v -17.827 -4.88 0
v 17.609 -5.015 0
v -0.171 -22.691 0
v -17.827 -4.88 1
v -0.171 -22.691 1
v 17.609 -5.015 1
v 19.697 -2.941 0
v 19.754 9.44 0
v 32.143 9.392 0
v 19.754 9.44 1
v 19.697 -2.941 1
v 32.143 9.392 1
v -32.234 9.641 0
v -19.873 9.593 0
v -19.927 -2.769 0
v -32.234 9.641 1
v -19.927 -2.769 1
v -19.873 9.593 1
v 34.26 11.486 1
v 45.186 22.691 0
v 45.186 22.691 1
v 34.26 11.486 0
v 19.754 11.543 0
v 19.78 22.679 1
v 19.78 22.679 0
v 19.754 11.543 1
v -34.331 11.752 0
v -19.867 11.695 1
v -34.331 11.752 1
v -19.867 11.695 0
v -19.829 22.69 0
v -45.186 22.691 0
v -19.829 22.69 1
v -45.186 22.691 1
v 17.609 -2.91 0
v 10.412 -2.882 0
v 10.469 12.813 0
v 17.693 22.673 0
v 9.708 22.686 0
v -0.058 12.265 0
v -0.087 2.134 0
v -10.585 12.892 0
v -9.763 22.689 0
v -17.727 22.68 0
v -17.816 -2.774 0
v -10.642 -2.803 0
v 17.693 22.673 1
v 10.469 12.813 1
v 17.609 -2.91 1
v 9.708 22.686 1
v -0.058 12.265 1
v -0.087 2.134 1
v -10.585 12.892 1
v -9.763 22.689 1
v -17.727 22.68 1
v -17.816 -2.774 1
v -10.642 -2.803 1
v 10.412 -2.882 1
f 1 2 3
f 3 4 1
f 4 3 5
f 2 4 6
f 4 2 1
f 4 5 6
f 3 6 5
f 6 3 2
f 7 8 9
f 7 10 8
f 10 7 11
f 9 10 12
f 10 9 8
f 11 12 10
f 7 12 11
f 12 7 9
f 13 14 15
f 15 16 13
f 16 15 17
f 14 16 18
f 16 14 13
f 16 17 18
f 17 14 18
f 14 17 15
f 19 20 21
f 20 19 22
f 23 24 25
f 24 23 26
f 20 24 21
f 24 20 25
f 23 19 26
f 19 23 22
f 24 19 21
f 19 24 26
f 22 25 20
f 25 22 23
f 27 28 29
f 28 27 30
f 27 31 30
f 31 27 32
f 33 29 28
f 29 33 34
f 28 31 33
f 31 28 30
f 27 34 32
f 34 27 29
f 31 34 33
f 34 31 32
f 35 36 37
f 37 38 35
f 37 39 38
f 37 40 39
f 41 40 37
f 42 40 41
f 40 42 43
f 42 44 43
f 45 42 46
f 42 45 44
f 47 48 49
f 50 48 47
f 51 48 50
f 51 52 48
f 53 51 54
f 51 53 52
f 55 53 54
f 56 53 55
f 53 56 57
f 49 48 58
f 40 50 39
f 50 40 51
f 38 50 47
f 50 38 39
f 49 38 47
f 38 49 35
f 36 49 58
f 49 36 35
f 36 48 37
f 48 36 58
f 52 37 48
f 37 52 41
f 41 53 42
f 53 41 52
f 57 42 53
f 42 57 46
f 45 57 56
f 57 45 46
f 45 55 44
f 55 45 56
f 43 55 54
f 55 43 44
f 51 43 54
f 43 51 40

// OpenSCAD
// Module names are of the form poly_<inkscape-path-id>().
// As a result you can associate a polygon in this OpenSCAD program with the
//  corresponding SVG element in the Inkscape document by looking for 
//  the XML element with the attribute id="inkscape-path-id".

// Paths have their own variables so they can be imported and used 
//  in polygon(points) structures in other programs.
// The NN_points is the list of all polygon XY vertices. 
// There may be an NN_paths variable as well. If it exists then it 
//  defines the nested paths. Both must be used in the 
//  polygon(points, paths) variant of the command.

profile_scale = 25.4/90; //made in inkscape in mm

// helper functions to determine the X,Y dimensions of the profiles
function min_x(shape_points) = min([ for (x = shape_points) min(x[0])]);
function max_x(shape_points) = max([ for (x = shape_points) max(x[0])]);
function min_y(shape_points) = min([ for (x = shape_points) min(x[1])]);
function max_y(shape_points) = max([ for (x = shape_points) max(x[1])]);

height = 1;
width = 1.0;


path2_0_points = [[-63.166600,17.290140],[62.393400,17.770140],[-0.606600,80.400140],[-63.166600,17.290140]];
path2_1_points = [[113.893400,-33.279860],[69.993400,-33.449860],[69.793400,10.420140],[113.893400,-33.279860]];
path2_2_points = [[-114.216600,-34.159860],[-70.416600,-33.989860],[-70.606600,9.810140],[-114.216600,-34.159860]];
path2_3_points = [[160.106600,-80.400140],[70.087790,-80.356915],[69.993400,-40.899860],[121.393400,-40.699860],[160.106600,-80.400140]];
path2_4_points = [[-160.106600,-80.399860],[-70.259801,-80.397182],[-70.396600,-41.439860],[-121.646600,-41.639860],[-160.106600,-80.399860]];
path2_5_points = [[-0.206600,-43.459860],[34.399010,-80.384908],[62.693400,-80.338911],[62.393400,10.310140],[36.893400,10.210140],[37.093400,-45.399860],[-0.306600,-7.559860],[-37.506600,-45.679860],[-37.706600,9.930140],[-63.126600,9.830140],[-62.813938,-80.360599],[-34.593290,-80.394650],[-0.206600,-43.459860]];

module poly_path2(h, w, res=4)  {
  scale([profile_scale, -profile_scale, 1])
  union()  {
    linear_extrude(height=h)
      polygon(path2_0_points);
    linear_extrude(height=h)
      polygon(path2_1_points);
    linear_extrude(height=h)
      polygon(path2_2_points);
    linear_extrude(height=h)
      polygon(path2_3_points);
    linear_extrude(height=h)
      polygon(path2_4_points);
    linear_extrude(height=h)
      polygon(path2_5_points);
  }
}

// The shapes
poly_path2(height, width);
